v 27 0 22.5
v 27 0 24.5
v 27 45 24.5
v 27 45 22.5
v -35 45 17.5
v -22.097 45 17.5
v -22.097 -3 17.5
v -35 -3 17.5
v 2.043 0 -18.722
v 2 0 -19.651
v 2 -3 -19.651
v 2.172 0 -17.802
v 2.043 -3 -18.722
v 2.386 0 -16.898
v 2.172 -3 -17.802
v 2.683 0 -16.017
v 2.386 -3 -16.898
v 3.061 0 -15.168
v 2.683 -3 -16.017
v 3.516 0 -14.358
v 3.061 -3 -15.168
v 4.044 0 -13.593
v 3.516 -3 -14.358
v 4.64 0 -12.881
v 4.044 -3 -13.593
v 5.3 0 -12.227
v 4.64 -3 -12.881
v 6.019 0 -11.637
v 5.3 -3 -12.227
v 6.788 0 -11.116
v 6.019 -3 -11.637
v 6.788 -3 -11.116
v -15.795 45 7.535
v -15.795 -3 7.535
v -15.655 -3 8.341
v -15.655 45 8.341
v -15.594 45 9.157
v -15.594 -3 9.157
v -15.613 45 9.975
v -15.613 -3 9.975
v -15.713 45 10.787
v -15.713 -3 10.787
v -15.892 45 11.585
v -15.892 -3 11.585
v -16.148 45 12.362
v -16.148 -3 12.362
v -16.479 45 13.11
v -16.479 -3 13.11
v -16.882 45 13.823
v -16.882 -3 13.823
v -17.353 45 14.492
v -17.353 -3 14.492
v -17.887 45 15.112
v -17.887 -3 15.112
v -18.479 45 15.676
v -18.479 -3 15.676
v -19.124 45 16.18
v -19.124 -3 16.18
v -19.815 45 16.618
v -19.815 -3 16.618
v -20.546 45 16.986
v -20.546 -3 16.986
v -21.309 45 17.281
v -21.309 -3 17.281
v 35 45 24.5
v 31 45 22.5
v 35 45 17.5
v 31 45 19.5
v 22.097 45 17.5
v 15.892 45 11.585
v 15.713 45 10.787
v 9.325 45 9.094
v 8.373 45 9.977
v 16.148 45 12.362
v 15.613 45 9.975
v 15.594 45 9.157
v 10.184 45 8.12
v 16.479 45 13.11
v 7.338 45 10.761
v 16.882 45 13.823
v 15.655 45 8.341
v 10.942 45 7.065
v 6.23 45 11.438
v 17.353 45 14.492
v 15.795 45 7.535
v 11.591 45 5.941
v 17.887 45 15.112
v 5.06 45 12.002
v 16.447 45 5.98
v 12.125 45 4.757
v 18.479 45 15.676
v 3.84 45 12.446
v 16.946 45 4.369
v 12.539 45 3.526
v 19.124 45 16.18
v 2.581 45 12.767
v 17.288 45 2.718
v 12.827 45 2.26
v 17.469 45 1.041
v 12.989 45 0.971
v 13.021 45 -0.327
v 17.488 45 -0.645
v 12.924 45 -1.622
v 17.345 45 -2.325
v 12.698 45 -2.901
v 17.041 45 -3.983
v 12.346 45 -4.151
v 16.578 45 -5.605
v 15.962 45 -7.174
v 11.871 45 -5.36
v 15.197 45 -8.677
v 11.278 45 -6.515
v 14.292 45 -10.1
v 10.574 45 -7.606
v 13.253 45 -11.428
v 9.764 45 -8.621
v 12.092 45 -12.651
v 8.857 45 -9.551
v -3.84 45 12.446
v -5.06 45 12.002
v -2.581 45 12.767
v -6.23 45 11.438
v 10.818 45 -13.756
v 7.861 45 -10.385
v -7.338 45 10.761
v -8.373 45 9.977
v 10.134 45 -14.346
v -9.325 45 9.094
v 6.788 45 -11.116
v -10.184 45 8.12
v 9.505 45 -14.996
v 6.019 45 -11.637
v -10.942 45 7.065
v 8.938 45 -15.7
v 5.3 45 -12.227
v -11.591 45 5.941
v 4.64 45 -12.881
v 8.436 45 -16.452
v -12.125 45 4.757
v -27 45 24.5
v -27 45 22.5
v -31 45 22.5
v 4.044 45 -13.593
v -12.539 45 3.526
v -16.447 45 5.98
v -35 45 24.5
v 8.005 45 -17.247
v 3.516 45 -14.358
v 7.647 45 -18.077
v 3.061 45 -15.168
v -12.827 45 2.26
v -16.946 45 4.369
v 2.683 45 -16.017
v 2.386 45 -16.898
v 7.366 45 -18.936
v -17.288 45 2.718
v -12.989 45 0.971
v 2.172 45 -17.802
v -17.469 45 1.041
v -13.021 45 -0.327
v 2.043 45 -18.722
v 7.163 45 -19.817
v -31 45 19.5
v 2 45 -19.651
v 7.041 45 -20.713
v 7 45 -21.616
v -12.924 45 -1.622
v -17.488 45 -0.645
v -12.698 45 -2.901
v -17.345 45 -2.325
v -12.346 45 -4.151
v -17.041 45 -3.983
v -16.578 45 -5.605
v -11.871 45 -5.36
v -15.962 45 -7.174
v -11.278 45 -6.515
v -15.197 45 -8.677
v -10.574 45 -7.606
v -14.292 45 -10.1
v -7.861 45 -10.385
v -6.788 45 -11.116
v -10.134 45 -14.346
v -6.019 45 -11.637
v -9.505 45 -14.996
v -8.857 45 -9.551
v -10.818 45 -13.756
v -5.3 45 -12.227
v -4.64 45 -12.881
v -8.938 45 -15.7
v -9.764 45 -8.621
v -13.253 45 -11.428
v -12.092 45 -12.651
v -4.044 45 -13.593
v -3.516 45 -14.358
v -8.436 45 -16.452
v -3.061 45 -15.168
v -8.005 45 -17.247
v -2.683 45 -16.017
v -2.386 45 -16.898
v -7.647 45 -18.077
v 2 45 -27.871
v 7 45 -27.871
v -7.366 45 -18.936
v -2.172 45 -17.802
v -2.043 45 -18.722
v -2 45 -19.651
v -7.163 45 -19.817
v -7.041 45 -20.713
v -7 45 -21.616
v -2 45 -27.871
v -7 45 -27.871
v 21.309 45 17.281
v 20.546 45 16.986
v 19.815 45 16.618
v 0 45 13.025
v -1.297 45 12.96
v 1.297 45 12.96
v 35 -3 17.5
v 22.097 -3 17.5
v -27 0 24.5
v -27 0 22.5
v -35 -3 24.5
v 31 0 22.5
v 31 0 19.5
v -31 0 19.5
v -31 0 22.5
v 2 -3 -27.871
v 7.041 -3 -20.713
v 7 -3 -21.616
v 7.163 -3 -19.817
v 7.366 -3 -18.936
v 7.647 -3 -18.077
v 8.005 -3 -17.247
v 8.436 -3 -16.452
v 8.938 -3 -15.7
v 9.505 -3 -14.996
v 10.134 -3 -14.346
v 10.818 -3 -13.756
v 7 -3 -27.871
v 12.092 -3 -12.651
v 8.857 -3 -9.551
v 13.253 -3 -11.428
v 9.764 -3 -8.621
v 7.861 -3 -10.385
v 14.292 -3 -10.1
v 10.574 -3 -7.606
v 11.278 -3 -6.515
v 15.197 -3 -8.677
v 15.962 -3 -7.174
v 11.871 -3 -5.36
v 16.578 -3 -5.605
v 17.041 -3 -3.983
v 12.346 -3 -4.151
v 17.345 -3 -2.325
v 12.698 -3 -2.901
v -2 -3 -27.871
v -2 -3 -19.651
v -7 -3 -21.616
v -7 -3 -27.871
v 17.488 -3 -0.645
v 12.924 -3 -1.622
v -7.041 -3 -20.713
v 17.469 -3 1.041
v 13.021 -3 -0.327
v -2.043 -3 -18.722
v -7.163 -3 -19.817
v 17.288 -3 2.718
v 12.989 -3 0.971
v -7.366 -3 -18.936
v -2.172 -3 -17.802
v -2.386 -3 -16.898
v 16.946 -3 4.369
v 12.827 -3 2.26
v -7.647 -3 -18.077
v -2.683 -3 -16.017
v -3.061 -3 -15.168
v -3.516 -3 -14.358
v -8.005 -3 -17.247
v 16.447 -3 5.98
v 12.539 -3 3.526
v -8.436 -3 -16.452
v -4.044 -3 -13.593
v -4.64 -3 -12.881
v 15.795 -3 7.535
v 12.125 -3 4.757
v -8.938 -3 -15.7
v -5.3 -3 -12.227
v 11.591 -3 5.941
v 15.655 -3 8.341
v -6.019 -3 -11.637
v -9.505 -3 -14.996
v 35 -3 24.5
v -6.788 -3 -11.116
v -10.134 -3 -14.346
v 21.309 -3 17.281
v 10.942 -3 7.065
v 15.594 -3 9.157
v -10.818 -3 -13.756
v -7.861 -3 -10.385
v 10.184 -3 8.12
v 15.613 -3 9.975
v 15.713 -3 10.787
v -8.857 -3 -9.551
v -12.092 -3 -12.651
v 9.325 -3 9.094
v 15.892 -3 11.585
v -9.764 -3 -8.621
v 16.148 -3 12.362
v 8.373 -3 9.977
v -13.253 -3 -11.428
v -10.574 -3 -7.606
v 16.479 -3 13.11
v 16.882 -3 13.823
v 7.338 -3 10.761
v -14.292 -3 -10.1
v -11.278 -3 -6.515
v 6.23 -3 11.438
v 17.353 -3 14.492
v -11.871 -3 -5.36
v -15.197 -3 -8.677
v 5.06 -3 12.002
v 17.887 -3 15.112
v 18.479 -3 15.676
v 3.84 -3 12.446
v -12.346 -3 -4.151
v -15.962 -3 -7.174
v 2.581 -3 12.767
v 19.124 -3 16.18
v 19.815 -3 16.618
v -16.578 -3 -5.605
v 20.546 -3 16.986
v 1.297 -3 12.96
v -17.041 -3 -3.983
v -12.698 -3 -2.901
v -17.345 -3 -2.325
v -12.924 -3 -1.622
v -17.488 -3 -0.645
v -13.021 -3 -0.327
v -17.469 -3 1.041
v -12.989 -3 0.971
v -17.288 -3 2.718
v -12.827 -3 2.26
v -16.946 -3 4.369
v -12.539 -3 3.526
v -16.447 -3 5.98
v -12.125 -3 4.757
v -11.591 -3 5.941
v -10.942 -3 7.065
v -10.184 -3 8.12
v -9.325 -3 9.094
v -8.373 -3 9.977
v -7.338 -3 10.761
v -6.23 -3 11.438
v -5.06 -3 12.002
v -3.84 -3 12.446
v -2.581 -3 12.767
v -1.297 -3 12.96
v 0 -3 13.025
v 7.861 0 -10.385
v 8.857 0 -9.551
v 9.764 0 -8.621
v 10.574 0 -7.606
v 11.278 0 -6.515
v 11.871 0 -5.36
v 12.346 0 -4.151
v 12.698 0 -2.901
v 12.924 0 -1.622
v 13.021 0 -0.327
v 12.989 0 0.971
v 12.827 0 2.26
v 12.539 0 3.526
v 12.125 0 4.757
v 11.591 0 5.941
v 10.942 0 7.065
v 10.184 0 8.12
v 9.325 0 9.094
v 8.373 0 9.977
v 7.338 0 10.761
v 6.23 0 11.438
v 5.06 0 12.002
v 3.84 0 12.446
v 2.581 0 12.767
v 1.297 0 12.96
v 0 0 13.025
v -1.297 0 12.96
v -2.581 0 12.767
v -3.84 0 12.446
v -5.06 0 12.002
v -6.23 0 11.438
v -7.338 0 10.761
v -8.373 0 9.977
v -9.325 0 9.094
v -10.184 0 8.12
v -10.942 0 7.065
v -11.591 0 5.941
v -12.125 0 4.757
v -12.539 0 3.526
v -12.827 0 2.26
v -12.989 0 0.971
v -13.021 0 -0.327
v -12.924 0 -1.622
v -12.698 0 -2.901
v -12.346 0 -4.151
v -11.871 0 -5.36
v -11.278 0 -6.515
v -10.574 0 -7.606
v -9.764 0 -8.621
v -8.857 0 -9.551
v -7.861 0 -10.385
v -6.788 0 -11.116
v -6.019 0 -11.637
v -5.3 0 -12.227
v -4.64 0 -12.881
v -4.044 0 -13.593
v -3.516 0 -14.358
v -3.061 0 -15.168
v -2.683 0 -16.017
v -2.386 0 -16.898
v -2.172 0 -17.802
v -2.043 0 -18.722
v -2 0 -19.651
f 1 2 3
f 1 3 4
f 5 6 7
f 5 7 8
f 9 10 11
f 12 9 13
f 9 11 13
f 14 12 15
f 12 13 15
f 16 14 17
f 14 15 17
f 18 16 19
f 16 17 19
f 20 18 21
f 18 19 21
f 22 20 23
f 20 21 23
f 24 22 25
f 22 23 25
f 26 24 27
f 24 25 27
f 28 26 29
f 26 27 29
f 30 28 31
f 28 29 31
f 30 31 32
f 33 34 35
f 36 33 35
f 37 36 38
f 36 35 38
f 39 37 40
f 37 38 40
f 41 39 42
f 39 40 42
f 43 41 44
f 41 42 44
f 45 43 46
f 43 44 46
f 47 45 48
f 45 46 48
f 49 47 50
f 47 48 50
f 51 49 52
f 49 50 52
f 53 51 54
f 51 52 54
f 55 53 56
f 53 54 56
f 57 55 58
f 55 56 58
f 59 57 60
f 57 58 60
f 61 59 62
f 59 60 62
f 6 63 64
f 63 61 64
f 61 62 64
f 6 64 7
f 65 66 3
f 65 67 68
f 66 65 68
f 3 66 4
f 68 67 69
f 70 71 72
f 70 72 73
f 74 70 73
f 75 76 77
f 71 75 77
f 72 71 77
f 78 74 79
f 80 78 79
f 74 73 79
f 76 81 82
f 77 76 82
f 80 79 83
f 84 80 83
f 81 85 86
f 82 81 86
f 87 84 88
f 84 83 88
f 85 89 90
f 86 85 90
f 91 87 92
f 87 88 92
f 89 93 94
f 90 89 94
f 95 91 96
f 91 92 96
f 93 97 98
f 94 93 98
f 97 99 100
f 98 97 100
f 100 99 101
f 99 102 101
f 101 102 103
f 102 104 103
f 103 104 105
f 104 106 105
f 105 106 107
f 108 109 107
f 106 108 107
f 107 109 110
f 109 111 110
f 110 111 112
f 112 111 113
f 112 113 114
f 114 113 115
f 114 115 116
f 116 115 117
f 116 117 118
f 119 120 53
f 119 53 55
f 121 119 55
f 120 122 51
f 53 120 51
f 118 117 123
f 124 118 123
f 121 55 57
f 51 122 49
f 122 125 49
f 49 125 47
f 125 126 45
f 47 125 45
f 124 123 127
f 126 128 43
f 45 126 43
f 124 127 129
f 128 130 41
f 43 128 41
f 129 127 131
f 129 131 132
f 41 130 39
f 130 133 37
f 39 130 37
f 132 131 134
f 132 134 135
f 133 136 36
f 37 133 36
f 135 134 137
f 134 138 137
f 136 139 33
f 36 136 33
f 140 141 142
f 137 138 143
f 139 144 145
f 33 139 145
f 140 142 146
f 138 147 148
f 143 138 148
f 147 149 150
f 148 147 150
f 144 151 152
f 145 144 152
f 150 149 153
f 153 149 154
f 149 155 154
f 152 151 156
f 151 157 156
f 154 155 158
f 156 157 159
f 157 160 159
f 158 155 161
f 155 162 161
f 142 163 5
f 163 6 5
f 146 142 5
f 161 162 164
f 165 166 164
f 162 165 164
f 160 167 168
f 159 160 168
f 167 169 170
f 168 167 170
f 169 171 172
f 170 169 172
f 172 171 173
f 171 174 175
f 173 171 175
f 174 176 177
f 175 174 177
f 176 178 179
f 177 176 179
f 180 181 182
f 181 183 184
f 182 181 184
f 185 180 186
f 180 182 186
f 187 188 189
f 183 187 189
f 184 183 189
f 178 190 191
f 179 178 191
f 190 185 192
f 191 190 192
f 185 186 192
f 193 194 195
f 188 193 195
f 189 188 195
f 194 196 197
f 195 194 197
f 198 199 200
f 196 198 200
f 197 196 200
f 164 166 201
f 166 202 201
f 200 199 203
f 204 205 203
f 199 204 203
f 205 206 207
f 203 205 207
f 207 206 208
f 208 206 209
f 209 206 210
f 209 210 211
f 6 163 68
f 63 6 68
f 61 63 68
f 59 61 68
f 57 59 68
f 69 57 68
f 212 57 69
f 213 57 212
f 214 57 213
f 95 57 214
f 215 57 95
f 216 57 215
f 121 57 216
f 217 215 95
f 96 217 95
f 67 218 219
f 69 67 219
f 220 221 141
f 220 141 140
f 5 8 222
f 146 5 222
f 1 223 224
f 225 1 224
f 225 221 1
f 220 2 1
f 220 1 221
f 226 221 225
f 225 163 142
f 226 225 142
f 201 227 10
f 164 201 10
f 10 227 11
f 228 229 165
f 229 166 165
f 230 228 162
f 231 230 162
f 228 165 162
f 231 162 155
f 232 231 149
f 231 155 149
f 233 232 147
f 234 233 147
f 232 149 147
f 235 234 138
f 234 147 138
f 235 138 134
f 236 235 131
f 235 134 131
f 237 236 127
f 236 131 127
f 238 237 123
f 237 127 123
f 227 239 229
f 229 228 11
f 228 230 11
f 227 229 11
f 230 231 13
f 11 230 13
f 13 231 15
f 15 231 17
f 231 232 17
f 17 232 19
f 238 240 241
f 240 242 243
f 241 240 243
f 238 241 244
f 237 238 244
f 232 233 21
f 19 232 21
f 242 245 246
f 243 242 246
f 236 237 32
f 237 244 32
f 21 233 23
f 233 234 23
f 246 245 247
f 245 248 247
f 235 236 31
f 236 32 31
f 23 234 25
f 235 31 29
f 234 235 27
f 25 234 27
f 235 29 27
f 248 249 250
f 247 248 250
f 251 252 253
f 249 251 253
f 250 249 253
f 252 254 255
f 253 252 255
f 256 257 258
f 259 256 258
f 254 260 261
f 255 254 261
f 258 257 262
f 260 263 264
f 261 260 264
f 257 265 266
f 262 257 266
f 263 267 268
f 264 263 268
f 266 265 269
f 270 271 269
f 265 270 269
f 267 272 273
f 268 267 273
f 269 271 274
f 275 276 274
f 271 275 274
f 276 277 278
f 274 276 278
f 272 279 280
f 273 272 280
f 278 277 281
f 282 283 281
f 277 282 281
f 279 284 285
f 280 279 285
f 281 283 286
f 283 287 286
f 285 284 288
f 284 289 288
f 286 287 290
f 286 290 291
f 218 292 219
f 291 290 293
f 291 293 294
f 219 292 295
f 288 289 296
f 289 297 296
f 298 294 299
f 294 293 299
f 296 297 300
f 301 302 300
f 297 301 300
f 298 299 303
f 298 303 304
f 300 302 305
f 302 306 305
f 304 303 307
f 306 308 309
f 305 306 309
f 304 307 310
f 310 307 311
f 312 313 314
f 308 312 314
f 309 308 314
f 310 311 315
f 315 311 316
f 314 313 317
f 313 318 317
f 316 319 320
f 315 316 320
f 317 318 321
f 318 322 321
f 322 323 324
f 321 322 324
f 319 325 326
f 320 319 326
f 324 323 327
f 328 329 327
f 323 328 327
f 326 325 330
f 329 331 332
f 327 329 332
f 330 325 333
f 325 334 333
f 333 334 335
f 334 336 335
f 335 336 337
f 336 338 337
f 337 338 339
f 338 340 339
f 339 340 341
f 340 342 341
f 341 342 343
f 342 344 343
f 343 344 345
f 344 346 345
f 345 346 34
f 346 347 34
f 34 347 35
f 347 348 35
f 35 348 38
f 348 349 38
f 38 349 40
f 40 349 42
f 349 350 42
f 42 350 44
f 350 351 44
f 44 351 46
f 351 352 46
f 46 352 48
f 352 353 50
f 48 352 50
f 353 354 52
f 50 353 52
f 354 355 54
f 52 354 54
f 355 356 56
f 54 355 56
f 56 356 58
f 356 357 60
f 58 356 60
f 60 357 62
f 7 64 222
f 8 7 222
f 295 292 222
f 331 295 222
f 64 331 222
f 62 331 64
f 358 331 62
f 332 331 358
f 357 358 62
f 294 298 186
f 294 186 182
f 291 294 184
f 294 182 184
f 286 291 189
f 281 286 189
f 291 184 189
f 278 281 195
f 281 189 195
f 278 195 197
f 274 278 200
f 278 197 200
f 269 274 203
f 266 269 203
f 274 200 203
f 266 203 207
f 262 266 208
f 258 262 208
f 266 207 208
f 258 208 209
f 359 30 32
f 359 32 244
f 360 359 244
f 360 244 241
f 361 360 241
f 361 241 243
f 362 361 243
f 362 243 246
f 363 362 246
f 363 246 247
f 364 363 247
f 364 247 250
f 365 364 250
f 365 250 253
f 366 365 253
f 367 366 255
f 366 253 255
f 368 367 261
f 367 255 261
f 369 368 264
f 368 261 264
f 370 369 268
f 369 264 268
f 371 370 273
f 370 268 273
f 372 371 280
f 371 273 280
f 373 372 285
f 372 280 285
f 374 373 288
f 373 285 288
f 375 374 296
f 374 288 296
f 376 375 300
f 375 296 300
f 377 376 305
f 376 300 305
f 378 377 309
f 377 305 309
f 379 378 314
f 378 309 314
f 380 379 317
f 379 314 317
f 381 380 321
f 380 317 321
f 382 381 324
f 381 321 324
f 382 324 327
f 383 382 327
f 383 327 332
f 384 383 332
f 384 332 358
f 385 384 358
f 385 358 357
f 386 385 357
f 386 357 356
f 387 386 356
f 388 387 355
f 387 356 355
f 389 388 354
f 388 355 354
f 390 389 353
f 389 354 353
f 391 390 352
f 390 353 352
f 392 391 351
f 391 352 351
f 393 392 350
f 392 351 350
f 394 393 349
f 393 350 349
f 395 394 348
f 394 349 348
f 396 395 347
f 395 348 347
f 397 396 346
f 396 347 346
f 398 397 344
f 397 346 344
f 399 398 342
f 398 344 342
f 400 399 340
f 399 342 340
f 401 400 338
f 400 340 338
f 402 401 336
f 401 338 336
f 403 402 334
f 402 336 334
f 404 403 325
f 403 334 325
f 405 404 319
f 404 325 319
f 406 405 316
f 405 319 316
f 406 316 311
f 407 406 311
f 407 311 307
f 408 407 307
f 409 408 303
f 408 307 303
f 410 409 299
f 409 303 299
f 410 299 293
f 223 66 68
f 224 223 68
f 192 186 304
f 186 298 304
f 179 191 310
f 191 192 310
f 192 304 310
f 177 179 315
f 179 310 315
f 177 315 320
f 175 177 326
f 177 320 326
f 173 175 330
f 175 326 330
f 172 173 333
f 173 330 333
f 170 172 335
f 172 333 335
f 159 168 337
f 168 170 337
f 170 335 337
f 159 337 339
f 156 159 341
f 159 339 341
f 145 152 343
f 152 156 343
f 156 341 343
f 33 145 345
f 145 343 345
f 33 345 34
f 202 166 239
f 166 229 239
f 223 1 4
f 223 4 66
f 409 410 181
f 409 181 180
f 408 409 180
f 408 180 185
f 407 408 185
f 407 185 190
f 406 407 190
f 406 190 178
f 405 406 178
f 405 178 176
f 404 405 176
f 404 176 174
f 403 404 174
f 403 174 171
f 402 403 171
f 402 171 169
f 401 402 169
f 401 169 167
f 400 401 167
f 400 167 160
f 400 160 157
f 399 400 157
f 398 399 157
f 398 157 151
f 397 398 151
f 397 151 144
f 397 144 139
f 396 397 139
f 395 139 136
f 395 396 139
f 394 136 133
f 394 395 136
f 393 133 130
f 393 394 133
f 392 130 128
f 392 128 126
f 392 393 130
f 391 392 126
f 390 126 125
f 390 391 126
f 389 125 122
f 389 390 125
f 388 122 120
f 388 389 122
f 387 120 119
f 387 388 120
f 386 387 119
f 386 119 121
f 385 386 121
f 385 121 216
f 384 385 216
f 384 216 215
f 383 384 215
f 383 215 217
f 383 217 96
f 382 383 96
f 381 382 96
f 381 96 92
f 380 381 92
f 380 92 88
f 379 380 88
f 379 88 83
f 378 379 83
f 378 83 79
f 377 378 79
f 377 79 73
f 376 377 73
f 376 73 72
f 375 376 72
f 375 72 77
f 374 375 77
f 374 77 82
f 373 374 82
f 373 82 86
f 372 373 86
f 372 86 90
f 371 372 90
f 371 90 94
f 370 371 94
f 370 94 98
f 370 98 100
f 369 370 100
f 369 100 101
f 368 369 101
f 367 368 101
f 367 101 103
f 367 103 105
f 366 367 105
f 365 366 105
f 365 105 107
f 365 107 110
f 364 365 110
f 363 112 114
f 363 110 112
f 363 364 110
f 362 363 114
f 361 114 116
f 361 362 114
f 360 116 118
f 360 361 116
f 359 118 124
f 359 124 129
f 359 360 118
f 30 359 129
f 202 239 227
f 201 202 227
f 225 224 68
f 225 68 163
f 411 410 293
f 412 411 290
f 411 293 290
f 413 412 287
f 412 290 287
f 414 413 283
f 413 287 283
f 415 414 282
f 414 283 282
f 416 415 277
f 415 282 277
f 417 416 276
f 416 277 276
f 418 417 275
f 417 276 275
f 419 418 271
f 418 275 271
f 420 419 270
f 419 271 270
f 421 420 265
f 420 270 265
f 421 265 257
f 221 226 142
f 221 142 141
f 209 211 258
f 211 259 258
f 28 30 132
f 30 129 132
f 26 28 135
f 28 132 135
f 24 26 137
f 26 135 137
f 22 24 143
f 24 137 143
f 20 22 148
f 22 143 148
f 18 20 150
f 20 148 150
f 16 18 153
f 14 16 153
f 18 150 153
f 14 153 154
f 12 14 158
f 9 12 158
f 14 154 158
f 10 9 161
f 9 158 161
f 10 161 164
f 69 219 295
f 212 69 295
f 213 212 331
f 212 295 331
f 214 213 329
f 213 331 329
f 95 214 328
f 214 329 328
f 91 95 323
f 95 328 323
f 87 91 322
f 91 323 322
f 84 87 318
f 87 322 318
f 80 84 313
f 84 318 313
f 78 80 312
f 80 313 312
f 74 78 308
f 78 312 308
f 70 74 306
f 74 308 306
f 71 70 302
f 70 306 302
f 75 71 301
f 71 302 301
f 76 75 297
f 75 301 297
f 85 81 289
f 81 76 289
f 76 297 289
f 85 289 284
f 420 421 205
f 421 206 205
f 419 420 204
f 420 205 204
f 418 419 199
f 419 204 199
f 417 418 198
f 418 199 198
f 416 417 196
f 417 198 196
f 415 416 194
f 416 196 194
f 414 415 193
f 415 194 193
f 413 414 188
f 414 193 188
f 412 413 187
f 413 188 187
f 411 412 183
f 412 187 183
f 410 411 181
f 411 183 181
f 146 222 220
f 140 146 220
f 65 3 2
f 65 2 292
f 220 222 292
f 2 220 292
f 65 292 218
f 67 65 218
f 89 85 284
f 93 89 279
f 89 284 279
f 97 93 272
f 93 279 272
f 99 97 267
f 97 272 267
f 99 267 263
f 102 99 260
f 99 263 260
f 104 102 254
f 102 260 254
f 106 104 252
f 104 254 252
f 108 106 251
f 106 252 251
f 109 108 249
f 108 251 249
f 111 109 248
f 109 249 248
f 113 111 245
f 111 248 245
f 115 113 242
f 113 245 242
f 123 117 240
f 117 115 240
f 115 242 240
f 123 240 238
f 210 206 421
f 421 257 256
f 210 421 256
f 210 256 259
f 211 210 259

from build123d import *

# Parameters (mm, degrees)
BOSS_EXTRUDE1_DEPTH = 45
FILLET1_R           = 10
BOSS_EXTRUDE4_START = 3
BOSS_EXTRUDE4_DEPTH = 3
FILLET2_R           = 10


with BuildPart() as part:
    # Sketch1 → Boss-Extrude1 (new body)
    with BuildSketch(Plane(origin=(0, 0, 0), x_dir=(1, 0, 0), z_dir=(0, 1, 0))):
        with BuildLine():
            Line((-7, 16.039014932), (-7, 27.870533206))
            Line((-7, 27.870533206), (-2, 27.870533206))
            Line((-2, 27.870533206), (-2, 18.870533206))
            Line((-2, 18.870533206), (-2, 12.870533206))
            ThreePointArc((-2, 12.870533206), (0, -13.025), (2, 12.870533206))
            Line((2, 12.870533206), (2, 18.870533206))
            Line((2, 18.870533206), (2, 27.870533206))
            Line((2, 27.870533206), (7, 27.870533206))
            Line((7, 27.870533206), (7, 16.039014932))
            ThreePointArc((7, 16.039014932), (16.396088806, 6.117047643), (15.794877567, -7.534709195))
            ThreePointArc((15.794877567, -7.534709195), (16.882152496, -13.822605417), (22.097186029, -17.5))
            Line((22.097186029, -17.5), (35, -17.5))
            Line((35, -17.5), (35, -24.5))
            Line((35, -24.5), (27, -24.5))
            Line((27, -24.5), (27, -22.5))
            Line((27, -22.5), (31, -22.5))
            Line((31, -22.5), (31, -19.5))
            Line((31, -19.5), (-31, -19.5))
            Line((-31, -19.5), (-31, -22.5))
            Line((-31, -22.5), (-27, -22.5))
            Line((-27, -22.5), (-27, -24.5))
            Line((-27, -24.5), (-35, -24.5))
            Line((-35, -24.5), (-35, -17.5))
            Line((-35, -17.5), (-22.097186029, -17.5))
            ThreePointArc((-22.097186029, -17.5), (-16.882152496, -13.822605417), (-15.794877567, -7.534709195))
            ThreePointArc((-15.794877567, -7.534709195), (-16.396088806, 6.117047643), (-7, 16.039014932))
        make_face()
    extrude(amount=BOSS_EXTRUDE1_DEPTH)

    # Fillet1
    fillet1_edges = [part.edges().sort_by_distance(p)[0] for p in [
        (-2, 22.5, -12.870533206),
        (2, 22.5, -12.870533206),
    ]]
    fillet(fillet1_edges, radius=FILLET1_R)

    # Sketch3 → Boss-Extrude4 (add)
    with BuildSketch(Plane.XZ.offset(BOSS_EXTRUDE4_START)):
        with BuildLine():
            Line((-35, 24.5), (35, 24.5))
            Line((35, 24.5), (35, 17.5))
            Line((35, 17.5), (22.097186029, 17.5))
            ThreePointArc((22.097186029, 17.5), (16.882152496, 13.822605417), (15.794877567, 7.534709195))
            ThreePointArc((15.794877567, 7.534709195), (16.396088806, -6.117047643), (7, -16.039014932))
            Line((7, -16.039014932), (7, -27.870533206))
            Line((7, -27.870533206), (2, -27.870533206))
            Line((2, -27.870533206), (2, -19.650715636))
            ThreePointArc((2, -19.650715636), (3.27883999, -14.757723905), (6.788273616, -11.116202873))
            ThreePointArc((6.788273616, -11.116202873), (0, 13.025), (-6.788273616, -11.116202873))
            ThreePointArc((-6.788273616, -11.116202873), (-3.27883999, -14.757723905), (-2, -19.650715636))
            Line((-2, -19.650715636), (-2, -27.870533206))
            Line((-2, -27.870533206), (-7, -27.870533206))
            Line((-7, -27.870533206), (-7, -16.039014932))
            ThreePointArc((-7, -16.039014932), (-16.396088806, -6.117047643), (-15.794877567, 7.534709195))
            ThreePointArc((-15.794877567, 7.534709195), (-16.882152496, 13.822605417), (-22.097186029, 17.5))
            Line((-22.097186029, 17.5), (-35, 17.5))
            Line((-35, 17.5), (-35, 24.5))
        make_face()
    extrude(amount=-BOSS_EXTRUDE4_DEPTH)

    # Fillet2
    fillet2_edges = [part.edges().sort_by_distance(p)[0] for p in [
        (7, 22.5, -16.039014932),
        (-7, 22.5, -16.039014932),
    ]]
    fillet(fillet2_edges, radius=FILLET2_R)


solid = part.part
